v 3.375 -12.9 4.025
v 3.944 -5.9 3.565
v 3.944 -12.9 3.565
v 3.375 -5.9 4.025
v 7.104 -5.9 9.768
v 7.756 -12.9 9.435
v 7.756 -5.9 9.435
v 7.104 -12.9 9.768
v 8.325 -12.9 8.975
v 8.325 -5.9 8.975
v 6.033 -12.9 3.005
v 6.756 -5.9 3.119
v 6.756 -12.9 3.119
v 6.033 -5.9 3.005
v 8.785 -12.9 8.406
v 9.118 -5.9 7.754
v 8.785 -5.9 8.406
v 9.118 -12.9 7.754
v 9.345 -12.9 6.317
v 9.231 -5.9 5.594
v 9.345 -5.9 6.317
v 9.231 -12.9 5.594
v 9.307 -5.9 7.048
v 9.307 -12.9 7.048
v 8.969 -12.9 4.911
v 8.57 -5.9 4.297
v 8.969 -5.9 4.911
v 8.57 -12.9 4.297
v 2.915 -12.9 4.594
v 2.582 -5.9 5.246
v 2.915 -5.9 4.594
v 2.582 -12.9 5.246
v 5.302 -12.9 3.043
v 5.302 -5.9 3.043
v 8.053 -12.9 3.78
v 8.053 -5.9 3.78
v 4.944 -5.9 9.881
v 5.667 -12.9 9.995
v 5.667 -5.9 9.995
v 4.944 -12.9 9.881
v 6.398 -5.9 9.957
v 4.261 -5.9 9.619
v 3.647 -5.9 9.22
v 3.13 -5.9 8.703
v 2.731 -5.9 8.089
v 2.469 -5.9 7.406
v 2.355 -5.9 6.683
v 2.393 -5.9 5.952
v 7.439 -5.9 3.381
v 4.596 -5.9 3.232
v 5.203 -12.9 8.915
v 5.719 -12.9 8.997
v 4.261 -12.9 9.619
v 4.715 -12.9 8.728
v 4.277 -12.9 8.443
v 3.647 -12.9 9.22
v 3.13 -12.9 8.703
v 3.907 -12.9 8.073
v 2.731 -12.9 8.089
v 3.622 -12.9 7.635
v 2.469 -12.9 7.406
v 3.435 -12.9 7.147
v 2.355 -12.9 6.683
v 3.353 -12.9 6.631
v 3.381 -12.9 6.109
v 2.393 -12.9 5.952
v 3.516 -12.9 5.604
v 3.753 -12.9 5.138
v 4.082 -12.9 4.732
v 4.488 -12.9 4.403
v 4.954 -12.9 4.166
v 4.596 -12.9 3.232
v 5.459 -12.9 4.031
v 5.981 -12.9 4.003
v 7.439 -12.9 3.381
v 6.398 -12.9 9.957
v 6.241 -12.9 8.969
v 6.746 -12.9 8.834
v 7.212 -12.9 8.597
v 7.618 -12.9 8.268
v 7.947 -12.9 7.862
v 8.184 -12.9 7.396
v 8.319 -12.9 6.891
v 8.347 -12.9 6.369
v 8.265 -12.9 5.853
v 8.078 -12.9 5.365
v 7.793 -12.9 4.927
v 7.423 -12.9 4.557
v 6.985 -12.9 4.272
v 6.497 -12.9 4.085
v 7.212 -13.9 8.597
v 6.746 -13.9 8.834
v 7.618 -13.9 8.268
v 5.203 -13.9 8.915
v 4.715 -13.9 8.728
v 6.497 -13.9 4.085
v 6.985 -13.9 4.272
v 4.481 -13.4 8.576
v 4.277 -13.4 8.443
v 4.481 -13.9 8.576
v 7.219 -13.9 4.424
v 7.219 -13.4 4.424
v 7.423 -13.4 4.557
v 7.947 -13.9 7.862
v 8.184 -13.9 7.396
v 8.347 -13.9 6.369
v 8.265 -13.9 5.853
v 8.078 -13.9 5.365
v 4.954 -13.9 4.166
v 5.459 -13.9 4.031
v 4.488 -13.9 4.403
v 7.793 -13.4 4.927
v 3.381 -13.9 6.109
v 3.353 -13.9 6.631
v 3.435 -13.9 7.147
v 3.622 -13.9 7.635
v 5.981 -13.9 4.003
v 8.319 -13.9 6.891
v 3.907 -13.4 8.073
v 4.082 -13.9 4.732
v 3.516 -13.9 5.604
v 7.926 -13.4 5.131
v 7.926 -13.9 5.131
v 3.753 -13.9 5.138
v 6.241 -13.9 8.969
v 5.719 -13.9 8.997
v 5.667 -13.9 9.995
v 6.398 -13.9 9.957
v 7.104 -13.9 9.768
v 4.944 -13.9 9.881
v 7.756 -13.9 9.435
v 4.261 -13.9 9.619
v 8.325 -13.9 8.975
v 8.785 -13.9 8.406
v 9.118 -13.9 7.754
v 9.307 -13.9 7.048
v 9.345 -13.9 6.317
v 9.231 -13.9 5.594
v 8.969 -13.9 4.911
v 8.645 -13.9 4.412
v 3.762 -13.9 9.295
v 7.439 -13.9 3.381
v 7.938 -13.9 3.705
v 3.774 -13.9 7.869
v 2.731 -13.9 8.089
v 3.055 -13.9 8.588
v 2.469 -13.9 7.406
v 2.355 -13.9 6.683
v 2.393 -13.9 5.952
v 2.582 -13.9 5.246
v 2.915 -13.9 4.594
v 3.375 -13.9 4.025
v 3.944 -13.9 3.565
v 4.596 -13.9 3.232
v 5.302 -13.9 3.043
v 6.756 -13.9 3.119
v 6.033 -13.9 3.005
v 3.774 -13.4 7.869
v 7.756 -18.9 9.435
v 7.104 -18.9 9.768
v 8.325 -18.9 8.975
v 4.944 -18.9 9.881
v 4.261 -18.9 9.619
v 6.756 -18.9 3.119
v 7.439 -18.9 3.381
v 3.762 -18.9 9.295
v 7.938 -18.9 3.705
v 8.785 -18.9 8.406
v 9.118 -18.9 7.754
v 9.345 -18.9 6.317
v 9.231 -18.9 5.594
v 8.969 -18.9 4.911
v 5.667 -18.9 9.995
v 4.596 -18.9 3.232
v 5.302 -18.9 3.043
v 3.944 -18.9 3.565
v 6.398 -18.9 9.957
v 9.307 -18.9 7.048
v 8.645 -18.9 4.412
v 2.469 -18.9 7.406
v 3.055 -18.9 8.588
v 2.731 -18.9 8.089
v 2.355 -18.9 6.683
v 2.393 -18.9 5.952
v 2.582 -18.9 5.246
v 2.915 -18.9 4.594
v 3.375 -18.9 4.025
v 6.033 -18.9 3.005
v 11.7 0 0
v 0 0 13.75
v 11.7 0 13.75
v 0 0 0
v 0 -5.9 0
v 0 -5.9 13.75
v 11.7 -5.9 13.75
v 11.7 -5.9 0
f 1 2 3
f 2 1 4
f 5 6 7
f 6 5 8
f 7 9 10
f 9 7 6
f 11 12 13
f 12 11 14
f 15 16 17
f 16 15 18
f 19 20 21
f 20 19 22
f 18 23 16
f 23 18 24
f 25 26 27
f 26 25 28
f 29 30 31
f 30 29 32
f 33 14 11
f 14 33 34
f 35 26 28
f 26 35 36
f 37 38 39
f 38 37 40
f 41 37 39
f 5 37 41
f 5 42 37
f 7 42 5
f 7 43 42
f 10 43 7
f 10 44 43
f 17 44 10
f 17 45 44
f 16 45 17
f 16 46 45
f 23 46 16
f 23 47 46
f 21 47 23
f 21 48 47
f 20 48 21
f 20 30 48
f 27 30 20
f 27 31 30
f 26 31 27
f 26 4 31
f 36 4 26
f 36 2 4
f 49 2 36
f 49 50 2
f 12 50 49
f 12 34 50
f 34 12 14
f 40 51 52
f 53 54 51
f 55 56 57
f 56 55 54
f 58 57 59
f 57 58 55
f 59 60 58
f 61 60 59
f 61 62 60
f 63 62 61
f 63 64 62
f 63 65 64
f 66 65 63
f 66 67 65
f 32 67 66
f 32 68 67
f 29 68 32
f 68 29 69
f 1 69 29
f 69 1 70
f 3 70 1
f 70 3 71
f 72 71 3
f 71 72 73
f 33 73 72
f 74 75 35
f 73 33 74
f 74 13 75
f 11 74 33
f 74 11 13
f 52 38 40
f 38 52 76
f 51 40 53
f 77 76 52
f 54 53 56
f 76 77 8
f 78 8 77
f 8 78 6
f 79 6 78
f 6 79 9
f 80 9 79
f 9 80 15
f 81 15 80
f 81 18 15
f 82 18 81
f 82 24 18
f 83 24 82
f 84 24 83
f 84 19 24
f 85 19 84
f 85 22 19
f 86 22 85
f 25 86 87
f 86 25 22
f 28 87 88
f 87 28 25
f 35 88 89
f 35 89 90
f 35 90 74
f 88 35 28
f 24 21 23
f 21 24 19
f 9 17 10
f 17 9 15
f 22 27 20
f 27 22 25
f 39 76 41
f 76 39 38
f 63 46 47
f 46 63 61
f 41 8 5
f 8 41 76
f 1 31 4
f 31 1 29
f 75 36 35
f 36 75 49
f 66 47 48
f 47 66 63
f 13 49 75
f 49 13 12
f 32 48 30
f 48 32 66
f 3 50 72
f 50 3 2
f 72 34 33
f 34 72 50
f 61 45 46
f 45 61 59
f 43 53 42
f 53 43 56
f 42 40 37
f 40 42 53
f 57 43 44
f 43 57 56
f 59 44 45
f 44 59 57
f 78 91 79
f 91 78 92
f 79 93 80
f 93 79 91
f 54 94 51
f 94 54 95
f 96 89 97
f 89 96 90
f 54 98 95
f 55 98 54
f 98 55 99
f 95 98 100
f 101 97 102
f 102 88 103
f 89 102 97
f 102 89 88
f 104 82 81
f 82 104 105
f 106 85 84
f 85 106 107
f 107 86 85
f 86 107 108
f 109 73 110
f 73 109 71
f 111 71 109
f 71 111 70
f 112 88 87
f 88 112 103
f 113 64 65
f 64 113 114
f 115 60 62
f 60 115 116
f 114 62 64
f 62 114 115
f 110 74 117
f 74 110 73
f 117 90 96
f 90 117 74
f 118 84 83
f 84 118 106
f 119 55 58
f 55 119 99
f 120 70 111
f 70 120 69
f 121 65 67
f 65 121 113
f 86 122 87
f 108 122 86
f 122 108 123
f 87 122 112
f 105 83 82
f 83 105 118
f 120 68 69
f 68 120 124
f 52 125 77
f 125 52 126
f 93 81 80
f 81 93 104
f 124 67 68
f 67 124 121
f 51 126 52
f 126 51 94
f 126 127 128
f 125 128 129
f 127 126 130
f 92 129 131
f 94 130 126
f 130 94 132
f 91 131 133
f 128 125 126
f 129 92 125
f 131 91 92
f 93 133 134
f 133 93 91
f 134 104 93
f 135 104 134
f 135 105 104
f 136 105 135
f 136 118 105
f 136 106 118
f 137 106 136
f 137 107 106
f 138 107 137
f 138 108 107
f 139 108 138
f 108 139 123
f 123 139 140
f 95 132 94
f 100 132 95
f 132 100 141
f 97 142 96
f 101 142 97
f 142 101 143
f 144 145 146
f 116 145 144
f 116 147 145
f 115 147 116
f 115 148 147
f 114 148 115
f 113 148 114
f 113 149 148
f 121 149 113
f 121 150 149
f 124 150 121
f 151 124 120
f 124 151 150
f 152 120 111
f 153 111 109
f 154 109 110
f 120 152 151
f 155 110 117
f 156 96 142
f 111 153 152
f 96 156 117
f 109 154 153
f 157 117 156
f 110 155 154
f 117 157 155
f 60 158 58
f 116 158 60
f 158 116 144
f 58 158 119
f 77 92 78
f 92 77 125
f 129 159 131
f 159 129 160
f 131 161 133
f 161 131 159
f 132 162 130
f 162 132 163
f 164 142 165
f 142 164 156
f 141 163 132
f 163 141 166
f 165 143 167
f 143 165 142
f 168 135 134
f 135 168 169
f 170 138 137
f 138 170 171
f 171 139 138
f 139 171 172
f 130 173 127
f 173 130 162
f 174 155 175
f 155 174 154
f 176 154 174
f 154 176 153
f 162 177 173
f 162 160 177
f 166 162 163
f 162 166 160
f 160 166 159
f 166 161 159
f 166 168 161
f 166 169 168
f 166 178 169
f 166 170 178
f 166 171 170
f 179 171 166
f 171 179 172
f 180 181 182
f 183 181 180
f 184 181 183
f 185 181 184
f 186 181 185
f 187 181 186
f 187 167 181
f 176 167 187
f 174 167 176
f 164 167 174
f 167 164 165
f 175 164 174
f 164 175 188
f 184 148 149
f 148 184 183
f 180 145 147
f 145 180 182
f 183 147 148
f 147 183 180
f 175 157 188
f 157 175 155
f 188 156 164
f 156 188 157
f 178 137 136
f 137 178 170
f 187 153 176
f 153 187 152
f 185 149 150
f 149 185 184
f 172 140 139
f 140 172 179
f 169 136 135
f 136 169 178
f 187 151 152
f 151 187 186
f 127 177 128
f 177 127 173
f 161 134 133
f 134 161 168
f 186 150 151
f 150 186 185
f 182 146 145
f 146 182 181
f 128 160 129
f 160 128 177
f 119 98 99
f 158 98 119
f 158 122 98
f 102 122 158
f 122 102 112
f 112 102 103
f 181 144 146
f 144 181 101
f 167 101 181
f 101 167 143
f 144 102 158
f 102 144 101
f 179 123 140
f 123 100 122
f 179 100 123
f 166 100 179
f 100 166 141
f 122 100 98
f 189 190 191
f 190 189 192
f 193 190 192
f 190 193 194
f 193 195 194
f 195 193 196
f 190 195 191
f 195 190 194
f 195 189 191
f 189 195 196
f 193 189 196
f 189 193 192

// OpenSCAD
// Values taken from datasheet
// https://www.tme.eu/Document/a279748d7142c2d68b83afb59e3ef975/LFSPXO018035.pdf

CHASSIS_Y_SHAFT_CENTER = 6.5;

CHASSIS_X_LENGTH = 11.7;
CHASSIS_Y_LENGTH = 7.25 + CHASSIS_Y_SHAFT_CENTER;
CHASSIS_Z_LENGTH = 5.9;

// Not very importnat values, no info in datasheet

//   |
//   |---------|        |----|
//             |--------| SH |
//   SHAFT_1    SHAFT_2   AF |
//             |--------| T_3|
//   |---------|        |----|
//   |

// TODO: correct values
SHAFT_1_RADIUS = 7.0/2;
SHAFT_1_HEIGHT = 7;

SHAFT_2_RADIUS = 5.0/2.0;
SHAFT_2_HEIGHT = 1;

SHAFT_3_RADIUS = 7.0/2.0;
SHAFT_3_HEIGHT = 5;


// Increase steps in render to have quality circles
$fs=0.01;


module Enclousure()
{
    linear_extrude(height = CHASSIS_Z_LENGTH, convexity = 10, twist = 0)
        square([CHASSIS_X_LENGTH,CHASSIS_Y_LENGTH]);
}



module ShaftIndent()
{
    SHAFT_INDENTATION_X = 1.0;
    SHAFT_INDENTATION_Z = SHAFT_2_HEIGHT + SHAFT_3_HEIGHT; // TODO correct value

    translate([0, 0, SHAFT_1_HEIGHT + SHAFT_2_HEIGHT/2])
        linear_extrude(height = SHAFT_1_HEIGHT, convexity = 10, twist = 0)
            square([SHAFT_INDENTATION_X,CHASSIS_Y_LENGTH], center=true);
}

module ShaftCylinder()
{
    union(){
        // shaft 1
        linear_extrude(height = SHAFT_1_HEIGHT, convexity = 10, twist = 0)
            circle(SHAFT_1_RADIUS);

        // shaft 2
        translate([0, 0, SHAFT_1_HEIGHT])
            linear_extrude(height = SHAFT_2_HEIGHT, convexity = 10, twist = 0)
                circle(SHAFT_2_RADIUS);

        // shaft 3
        translate([0, 0, SHAFT_1_HEIGHT+SHAFT_2_HEIGHT])
            linear_extrude(height = SHAFT_3_HEIGHT, convexity = 10, twist = 0)
                circle(SHAFT_3_RADIUS);
    }
}

module Shaft()
{
    rotate([0,0,45]) // give it a nice look
        difference(){
            ShaftCylinder();
            ShaftIndent();
        }
}

module Encoder(){
    rotate([90, 0, 0]){
        Enclousure();
            translate([CHASSIS_X_LENGTH/2, CHASSIS_Y_SHAFT_CENTER, CHASSIS_Z_LENGTH])                    
                Shaft();
    }
}

Encoder();
